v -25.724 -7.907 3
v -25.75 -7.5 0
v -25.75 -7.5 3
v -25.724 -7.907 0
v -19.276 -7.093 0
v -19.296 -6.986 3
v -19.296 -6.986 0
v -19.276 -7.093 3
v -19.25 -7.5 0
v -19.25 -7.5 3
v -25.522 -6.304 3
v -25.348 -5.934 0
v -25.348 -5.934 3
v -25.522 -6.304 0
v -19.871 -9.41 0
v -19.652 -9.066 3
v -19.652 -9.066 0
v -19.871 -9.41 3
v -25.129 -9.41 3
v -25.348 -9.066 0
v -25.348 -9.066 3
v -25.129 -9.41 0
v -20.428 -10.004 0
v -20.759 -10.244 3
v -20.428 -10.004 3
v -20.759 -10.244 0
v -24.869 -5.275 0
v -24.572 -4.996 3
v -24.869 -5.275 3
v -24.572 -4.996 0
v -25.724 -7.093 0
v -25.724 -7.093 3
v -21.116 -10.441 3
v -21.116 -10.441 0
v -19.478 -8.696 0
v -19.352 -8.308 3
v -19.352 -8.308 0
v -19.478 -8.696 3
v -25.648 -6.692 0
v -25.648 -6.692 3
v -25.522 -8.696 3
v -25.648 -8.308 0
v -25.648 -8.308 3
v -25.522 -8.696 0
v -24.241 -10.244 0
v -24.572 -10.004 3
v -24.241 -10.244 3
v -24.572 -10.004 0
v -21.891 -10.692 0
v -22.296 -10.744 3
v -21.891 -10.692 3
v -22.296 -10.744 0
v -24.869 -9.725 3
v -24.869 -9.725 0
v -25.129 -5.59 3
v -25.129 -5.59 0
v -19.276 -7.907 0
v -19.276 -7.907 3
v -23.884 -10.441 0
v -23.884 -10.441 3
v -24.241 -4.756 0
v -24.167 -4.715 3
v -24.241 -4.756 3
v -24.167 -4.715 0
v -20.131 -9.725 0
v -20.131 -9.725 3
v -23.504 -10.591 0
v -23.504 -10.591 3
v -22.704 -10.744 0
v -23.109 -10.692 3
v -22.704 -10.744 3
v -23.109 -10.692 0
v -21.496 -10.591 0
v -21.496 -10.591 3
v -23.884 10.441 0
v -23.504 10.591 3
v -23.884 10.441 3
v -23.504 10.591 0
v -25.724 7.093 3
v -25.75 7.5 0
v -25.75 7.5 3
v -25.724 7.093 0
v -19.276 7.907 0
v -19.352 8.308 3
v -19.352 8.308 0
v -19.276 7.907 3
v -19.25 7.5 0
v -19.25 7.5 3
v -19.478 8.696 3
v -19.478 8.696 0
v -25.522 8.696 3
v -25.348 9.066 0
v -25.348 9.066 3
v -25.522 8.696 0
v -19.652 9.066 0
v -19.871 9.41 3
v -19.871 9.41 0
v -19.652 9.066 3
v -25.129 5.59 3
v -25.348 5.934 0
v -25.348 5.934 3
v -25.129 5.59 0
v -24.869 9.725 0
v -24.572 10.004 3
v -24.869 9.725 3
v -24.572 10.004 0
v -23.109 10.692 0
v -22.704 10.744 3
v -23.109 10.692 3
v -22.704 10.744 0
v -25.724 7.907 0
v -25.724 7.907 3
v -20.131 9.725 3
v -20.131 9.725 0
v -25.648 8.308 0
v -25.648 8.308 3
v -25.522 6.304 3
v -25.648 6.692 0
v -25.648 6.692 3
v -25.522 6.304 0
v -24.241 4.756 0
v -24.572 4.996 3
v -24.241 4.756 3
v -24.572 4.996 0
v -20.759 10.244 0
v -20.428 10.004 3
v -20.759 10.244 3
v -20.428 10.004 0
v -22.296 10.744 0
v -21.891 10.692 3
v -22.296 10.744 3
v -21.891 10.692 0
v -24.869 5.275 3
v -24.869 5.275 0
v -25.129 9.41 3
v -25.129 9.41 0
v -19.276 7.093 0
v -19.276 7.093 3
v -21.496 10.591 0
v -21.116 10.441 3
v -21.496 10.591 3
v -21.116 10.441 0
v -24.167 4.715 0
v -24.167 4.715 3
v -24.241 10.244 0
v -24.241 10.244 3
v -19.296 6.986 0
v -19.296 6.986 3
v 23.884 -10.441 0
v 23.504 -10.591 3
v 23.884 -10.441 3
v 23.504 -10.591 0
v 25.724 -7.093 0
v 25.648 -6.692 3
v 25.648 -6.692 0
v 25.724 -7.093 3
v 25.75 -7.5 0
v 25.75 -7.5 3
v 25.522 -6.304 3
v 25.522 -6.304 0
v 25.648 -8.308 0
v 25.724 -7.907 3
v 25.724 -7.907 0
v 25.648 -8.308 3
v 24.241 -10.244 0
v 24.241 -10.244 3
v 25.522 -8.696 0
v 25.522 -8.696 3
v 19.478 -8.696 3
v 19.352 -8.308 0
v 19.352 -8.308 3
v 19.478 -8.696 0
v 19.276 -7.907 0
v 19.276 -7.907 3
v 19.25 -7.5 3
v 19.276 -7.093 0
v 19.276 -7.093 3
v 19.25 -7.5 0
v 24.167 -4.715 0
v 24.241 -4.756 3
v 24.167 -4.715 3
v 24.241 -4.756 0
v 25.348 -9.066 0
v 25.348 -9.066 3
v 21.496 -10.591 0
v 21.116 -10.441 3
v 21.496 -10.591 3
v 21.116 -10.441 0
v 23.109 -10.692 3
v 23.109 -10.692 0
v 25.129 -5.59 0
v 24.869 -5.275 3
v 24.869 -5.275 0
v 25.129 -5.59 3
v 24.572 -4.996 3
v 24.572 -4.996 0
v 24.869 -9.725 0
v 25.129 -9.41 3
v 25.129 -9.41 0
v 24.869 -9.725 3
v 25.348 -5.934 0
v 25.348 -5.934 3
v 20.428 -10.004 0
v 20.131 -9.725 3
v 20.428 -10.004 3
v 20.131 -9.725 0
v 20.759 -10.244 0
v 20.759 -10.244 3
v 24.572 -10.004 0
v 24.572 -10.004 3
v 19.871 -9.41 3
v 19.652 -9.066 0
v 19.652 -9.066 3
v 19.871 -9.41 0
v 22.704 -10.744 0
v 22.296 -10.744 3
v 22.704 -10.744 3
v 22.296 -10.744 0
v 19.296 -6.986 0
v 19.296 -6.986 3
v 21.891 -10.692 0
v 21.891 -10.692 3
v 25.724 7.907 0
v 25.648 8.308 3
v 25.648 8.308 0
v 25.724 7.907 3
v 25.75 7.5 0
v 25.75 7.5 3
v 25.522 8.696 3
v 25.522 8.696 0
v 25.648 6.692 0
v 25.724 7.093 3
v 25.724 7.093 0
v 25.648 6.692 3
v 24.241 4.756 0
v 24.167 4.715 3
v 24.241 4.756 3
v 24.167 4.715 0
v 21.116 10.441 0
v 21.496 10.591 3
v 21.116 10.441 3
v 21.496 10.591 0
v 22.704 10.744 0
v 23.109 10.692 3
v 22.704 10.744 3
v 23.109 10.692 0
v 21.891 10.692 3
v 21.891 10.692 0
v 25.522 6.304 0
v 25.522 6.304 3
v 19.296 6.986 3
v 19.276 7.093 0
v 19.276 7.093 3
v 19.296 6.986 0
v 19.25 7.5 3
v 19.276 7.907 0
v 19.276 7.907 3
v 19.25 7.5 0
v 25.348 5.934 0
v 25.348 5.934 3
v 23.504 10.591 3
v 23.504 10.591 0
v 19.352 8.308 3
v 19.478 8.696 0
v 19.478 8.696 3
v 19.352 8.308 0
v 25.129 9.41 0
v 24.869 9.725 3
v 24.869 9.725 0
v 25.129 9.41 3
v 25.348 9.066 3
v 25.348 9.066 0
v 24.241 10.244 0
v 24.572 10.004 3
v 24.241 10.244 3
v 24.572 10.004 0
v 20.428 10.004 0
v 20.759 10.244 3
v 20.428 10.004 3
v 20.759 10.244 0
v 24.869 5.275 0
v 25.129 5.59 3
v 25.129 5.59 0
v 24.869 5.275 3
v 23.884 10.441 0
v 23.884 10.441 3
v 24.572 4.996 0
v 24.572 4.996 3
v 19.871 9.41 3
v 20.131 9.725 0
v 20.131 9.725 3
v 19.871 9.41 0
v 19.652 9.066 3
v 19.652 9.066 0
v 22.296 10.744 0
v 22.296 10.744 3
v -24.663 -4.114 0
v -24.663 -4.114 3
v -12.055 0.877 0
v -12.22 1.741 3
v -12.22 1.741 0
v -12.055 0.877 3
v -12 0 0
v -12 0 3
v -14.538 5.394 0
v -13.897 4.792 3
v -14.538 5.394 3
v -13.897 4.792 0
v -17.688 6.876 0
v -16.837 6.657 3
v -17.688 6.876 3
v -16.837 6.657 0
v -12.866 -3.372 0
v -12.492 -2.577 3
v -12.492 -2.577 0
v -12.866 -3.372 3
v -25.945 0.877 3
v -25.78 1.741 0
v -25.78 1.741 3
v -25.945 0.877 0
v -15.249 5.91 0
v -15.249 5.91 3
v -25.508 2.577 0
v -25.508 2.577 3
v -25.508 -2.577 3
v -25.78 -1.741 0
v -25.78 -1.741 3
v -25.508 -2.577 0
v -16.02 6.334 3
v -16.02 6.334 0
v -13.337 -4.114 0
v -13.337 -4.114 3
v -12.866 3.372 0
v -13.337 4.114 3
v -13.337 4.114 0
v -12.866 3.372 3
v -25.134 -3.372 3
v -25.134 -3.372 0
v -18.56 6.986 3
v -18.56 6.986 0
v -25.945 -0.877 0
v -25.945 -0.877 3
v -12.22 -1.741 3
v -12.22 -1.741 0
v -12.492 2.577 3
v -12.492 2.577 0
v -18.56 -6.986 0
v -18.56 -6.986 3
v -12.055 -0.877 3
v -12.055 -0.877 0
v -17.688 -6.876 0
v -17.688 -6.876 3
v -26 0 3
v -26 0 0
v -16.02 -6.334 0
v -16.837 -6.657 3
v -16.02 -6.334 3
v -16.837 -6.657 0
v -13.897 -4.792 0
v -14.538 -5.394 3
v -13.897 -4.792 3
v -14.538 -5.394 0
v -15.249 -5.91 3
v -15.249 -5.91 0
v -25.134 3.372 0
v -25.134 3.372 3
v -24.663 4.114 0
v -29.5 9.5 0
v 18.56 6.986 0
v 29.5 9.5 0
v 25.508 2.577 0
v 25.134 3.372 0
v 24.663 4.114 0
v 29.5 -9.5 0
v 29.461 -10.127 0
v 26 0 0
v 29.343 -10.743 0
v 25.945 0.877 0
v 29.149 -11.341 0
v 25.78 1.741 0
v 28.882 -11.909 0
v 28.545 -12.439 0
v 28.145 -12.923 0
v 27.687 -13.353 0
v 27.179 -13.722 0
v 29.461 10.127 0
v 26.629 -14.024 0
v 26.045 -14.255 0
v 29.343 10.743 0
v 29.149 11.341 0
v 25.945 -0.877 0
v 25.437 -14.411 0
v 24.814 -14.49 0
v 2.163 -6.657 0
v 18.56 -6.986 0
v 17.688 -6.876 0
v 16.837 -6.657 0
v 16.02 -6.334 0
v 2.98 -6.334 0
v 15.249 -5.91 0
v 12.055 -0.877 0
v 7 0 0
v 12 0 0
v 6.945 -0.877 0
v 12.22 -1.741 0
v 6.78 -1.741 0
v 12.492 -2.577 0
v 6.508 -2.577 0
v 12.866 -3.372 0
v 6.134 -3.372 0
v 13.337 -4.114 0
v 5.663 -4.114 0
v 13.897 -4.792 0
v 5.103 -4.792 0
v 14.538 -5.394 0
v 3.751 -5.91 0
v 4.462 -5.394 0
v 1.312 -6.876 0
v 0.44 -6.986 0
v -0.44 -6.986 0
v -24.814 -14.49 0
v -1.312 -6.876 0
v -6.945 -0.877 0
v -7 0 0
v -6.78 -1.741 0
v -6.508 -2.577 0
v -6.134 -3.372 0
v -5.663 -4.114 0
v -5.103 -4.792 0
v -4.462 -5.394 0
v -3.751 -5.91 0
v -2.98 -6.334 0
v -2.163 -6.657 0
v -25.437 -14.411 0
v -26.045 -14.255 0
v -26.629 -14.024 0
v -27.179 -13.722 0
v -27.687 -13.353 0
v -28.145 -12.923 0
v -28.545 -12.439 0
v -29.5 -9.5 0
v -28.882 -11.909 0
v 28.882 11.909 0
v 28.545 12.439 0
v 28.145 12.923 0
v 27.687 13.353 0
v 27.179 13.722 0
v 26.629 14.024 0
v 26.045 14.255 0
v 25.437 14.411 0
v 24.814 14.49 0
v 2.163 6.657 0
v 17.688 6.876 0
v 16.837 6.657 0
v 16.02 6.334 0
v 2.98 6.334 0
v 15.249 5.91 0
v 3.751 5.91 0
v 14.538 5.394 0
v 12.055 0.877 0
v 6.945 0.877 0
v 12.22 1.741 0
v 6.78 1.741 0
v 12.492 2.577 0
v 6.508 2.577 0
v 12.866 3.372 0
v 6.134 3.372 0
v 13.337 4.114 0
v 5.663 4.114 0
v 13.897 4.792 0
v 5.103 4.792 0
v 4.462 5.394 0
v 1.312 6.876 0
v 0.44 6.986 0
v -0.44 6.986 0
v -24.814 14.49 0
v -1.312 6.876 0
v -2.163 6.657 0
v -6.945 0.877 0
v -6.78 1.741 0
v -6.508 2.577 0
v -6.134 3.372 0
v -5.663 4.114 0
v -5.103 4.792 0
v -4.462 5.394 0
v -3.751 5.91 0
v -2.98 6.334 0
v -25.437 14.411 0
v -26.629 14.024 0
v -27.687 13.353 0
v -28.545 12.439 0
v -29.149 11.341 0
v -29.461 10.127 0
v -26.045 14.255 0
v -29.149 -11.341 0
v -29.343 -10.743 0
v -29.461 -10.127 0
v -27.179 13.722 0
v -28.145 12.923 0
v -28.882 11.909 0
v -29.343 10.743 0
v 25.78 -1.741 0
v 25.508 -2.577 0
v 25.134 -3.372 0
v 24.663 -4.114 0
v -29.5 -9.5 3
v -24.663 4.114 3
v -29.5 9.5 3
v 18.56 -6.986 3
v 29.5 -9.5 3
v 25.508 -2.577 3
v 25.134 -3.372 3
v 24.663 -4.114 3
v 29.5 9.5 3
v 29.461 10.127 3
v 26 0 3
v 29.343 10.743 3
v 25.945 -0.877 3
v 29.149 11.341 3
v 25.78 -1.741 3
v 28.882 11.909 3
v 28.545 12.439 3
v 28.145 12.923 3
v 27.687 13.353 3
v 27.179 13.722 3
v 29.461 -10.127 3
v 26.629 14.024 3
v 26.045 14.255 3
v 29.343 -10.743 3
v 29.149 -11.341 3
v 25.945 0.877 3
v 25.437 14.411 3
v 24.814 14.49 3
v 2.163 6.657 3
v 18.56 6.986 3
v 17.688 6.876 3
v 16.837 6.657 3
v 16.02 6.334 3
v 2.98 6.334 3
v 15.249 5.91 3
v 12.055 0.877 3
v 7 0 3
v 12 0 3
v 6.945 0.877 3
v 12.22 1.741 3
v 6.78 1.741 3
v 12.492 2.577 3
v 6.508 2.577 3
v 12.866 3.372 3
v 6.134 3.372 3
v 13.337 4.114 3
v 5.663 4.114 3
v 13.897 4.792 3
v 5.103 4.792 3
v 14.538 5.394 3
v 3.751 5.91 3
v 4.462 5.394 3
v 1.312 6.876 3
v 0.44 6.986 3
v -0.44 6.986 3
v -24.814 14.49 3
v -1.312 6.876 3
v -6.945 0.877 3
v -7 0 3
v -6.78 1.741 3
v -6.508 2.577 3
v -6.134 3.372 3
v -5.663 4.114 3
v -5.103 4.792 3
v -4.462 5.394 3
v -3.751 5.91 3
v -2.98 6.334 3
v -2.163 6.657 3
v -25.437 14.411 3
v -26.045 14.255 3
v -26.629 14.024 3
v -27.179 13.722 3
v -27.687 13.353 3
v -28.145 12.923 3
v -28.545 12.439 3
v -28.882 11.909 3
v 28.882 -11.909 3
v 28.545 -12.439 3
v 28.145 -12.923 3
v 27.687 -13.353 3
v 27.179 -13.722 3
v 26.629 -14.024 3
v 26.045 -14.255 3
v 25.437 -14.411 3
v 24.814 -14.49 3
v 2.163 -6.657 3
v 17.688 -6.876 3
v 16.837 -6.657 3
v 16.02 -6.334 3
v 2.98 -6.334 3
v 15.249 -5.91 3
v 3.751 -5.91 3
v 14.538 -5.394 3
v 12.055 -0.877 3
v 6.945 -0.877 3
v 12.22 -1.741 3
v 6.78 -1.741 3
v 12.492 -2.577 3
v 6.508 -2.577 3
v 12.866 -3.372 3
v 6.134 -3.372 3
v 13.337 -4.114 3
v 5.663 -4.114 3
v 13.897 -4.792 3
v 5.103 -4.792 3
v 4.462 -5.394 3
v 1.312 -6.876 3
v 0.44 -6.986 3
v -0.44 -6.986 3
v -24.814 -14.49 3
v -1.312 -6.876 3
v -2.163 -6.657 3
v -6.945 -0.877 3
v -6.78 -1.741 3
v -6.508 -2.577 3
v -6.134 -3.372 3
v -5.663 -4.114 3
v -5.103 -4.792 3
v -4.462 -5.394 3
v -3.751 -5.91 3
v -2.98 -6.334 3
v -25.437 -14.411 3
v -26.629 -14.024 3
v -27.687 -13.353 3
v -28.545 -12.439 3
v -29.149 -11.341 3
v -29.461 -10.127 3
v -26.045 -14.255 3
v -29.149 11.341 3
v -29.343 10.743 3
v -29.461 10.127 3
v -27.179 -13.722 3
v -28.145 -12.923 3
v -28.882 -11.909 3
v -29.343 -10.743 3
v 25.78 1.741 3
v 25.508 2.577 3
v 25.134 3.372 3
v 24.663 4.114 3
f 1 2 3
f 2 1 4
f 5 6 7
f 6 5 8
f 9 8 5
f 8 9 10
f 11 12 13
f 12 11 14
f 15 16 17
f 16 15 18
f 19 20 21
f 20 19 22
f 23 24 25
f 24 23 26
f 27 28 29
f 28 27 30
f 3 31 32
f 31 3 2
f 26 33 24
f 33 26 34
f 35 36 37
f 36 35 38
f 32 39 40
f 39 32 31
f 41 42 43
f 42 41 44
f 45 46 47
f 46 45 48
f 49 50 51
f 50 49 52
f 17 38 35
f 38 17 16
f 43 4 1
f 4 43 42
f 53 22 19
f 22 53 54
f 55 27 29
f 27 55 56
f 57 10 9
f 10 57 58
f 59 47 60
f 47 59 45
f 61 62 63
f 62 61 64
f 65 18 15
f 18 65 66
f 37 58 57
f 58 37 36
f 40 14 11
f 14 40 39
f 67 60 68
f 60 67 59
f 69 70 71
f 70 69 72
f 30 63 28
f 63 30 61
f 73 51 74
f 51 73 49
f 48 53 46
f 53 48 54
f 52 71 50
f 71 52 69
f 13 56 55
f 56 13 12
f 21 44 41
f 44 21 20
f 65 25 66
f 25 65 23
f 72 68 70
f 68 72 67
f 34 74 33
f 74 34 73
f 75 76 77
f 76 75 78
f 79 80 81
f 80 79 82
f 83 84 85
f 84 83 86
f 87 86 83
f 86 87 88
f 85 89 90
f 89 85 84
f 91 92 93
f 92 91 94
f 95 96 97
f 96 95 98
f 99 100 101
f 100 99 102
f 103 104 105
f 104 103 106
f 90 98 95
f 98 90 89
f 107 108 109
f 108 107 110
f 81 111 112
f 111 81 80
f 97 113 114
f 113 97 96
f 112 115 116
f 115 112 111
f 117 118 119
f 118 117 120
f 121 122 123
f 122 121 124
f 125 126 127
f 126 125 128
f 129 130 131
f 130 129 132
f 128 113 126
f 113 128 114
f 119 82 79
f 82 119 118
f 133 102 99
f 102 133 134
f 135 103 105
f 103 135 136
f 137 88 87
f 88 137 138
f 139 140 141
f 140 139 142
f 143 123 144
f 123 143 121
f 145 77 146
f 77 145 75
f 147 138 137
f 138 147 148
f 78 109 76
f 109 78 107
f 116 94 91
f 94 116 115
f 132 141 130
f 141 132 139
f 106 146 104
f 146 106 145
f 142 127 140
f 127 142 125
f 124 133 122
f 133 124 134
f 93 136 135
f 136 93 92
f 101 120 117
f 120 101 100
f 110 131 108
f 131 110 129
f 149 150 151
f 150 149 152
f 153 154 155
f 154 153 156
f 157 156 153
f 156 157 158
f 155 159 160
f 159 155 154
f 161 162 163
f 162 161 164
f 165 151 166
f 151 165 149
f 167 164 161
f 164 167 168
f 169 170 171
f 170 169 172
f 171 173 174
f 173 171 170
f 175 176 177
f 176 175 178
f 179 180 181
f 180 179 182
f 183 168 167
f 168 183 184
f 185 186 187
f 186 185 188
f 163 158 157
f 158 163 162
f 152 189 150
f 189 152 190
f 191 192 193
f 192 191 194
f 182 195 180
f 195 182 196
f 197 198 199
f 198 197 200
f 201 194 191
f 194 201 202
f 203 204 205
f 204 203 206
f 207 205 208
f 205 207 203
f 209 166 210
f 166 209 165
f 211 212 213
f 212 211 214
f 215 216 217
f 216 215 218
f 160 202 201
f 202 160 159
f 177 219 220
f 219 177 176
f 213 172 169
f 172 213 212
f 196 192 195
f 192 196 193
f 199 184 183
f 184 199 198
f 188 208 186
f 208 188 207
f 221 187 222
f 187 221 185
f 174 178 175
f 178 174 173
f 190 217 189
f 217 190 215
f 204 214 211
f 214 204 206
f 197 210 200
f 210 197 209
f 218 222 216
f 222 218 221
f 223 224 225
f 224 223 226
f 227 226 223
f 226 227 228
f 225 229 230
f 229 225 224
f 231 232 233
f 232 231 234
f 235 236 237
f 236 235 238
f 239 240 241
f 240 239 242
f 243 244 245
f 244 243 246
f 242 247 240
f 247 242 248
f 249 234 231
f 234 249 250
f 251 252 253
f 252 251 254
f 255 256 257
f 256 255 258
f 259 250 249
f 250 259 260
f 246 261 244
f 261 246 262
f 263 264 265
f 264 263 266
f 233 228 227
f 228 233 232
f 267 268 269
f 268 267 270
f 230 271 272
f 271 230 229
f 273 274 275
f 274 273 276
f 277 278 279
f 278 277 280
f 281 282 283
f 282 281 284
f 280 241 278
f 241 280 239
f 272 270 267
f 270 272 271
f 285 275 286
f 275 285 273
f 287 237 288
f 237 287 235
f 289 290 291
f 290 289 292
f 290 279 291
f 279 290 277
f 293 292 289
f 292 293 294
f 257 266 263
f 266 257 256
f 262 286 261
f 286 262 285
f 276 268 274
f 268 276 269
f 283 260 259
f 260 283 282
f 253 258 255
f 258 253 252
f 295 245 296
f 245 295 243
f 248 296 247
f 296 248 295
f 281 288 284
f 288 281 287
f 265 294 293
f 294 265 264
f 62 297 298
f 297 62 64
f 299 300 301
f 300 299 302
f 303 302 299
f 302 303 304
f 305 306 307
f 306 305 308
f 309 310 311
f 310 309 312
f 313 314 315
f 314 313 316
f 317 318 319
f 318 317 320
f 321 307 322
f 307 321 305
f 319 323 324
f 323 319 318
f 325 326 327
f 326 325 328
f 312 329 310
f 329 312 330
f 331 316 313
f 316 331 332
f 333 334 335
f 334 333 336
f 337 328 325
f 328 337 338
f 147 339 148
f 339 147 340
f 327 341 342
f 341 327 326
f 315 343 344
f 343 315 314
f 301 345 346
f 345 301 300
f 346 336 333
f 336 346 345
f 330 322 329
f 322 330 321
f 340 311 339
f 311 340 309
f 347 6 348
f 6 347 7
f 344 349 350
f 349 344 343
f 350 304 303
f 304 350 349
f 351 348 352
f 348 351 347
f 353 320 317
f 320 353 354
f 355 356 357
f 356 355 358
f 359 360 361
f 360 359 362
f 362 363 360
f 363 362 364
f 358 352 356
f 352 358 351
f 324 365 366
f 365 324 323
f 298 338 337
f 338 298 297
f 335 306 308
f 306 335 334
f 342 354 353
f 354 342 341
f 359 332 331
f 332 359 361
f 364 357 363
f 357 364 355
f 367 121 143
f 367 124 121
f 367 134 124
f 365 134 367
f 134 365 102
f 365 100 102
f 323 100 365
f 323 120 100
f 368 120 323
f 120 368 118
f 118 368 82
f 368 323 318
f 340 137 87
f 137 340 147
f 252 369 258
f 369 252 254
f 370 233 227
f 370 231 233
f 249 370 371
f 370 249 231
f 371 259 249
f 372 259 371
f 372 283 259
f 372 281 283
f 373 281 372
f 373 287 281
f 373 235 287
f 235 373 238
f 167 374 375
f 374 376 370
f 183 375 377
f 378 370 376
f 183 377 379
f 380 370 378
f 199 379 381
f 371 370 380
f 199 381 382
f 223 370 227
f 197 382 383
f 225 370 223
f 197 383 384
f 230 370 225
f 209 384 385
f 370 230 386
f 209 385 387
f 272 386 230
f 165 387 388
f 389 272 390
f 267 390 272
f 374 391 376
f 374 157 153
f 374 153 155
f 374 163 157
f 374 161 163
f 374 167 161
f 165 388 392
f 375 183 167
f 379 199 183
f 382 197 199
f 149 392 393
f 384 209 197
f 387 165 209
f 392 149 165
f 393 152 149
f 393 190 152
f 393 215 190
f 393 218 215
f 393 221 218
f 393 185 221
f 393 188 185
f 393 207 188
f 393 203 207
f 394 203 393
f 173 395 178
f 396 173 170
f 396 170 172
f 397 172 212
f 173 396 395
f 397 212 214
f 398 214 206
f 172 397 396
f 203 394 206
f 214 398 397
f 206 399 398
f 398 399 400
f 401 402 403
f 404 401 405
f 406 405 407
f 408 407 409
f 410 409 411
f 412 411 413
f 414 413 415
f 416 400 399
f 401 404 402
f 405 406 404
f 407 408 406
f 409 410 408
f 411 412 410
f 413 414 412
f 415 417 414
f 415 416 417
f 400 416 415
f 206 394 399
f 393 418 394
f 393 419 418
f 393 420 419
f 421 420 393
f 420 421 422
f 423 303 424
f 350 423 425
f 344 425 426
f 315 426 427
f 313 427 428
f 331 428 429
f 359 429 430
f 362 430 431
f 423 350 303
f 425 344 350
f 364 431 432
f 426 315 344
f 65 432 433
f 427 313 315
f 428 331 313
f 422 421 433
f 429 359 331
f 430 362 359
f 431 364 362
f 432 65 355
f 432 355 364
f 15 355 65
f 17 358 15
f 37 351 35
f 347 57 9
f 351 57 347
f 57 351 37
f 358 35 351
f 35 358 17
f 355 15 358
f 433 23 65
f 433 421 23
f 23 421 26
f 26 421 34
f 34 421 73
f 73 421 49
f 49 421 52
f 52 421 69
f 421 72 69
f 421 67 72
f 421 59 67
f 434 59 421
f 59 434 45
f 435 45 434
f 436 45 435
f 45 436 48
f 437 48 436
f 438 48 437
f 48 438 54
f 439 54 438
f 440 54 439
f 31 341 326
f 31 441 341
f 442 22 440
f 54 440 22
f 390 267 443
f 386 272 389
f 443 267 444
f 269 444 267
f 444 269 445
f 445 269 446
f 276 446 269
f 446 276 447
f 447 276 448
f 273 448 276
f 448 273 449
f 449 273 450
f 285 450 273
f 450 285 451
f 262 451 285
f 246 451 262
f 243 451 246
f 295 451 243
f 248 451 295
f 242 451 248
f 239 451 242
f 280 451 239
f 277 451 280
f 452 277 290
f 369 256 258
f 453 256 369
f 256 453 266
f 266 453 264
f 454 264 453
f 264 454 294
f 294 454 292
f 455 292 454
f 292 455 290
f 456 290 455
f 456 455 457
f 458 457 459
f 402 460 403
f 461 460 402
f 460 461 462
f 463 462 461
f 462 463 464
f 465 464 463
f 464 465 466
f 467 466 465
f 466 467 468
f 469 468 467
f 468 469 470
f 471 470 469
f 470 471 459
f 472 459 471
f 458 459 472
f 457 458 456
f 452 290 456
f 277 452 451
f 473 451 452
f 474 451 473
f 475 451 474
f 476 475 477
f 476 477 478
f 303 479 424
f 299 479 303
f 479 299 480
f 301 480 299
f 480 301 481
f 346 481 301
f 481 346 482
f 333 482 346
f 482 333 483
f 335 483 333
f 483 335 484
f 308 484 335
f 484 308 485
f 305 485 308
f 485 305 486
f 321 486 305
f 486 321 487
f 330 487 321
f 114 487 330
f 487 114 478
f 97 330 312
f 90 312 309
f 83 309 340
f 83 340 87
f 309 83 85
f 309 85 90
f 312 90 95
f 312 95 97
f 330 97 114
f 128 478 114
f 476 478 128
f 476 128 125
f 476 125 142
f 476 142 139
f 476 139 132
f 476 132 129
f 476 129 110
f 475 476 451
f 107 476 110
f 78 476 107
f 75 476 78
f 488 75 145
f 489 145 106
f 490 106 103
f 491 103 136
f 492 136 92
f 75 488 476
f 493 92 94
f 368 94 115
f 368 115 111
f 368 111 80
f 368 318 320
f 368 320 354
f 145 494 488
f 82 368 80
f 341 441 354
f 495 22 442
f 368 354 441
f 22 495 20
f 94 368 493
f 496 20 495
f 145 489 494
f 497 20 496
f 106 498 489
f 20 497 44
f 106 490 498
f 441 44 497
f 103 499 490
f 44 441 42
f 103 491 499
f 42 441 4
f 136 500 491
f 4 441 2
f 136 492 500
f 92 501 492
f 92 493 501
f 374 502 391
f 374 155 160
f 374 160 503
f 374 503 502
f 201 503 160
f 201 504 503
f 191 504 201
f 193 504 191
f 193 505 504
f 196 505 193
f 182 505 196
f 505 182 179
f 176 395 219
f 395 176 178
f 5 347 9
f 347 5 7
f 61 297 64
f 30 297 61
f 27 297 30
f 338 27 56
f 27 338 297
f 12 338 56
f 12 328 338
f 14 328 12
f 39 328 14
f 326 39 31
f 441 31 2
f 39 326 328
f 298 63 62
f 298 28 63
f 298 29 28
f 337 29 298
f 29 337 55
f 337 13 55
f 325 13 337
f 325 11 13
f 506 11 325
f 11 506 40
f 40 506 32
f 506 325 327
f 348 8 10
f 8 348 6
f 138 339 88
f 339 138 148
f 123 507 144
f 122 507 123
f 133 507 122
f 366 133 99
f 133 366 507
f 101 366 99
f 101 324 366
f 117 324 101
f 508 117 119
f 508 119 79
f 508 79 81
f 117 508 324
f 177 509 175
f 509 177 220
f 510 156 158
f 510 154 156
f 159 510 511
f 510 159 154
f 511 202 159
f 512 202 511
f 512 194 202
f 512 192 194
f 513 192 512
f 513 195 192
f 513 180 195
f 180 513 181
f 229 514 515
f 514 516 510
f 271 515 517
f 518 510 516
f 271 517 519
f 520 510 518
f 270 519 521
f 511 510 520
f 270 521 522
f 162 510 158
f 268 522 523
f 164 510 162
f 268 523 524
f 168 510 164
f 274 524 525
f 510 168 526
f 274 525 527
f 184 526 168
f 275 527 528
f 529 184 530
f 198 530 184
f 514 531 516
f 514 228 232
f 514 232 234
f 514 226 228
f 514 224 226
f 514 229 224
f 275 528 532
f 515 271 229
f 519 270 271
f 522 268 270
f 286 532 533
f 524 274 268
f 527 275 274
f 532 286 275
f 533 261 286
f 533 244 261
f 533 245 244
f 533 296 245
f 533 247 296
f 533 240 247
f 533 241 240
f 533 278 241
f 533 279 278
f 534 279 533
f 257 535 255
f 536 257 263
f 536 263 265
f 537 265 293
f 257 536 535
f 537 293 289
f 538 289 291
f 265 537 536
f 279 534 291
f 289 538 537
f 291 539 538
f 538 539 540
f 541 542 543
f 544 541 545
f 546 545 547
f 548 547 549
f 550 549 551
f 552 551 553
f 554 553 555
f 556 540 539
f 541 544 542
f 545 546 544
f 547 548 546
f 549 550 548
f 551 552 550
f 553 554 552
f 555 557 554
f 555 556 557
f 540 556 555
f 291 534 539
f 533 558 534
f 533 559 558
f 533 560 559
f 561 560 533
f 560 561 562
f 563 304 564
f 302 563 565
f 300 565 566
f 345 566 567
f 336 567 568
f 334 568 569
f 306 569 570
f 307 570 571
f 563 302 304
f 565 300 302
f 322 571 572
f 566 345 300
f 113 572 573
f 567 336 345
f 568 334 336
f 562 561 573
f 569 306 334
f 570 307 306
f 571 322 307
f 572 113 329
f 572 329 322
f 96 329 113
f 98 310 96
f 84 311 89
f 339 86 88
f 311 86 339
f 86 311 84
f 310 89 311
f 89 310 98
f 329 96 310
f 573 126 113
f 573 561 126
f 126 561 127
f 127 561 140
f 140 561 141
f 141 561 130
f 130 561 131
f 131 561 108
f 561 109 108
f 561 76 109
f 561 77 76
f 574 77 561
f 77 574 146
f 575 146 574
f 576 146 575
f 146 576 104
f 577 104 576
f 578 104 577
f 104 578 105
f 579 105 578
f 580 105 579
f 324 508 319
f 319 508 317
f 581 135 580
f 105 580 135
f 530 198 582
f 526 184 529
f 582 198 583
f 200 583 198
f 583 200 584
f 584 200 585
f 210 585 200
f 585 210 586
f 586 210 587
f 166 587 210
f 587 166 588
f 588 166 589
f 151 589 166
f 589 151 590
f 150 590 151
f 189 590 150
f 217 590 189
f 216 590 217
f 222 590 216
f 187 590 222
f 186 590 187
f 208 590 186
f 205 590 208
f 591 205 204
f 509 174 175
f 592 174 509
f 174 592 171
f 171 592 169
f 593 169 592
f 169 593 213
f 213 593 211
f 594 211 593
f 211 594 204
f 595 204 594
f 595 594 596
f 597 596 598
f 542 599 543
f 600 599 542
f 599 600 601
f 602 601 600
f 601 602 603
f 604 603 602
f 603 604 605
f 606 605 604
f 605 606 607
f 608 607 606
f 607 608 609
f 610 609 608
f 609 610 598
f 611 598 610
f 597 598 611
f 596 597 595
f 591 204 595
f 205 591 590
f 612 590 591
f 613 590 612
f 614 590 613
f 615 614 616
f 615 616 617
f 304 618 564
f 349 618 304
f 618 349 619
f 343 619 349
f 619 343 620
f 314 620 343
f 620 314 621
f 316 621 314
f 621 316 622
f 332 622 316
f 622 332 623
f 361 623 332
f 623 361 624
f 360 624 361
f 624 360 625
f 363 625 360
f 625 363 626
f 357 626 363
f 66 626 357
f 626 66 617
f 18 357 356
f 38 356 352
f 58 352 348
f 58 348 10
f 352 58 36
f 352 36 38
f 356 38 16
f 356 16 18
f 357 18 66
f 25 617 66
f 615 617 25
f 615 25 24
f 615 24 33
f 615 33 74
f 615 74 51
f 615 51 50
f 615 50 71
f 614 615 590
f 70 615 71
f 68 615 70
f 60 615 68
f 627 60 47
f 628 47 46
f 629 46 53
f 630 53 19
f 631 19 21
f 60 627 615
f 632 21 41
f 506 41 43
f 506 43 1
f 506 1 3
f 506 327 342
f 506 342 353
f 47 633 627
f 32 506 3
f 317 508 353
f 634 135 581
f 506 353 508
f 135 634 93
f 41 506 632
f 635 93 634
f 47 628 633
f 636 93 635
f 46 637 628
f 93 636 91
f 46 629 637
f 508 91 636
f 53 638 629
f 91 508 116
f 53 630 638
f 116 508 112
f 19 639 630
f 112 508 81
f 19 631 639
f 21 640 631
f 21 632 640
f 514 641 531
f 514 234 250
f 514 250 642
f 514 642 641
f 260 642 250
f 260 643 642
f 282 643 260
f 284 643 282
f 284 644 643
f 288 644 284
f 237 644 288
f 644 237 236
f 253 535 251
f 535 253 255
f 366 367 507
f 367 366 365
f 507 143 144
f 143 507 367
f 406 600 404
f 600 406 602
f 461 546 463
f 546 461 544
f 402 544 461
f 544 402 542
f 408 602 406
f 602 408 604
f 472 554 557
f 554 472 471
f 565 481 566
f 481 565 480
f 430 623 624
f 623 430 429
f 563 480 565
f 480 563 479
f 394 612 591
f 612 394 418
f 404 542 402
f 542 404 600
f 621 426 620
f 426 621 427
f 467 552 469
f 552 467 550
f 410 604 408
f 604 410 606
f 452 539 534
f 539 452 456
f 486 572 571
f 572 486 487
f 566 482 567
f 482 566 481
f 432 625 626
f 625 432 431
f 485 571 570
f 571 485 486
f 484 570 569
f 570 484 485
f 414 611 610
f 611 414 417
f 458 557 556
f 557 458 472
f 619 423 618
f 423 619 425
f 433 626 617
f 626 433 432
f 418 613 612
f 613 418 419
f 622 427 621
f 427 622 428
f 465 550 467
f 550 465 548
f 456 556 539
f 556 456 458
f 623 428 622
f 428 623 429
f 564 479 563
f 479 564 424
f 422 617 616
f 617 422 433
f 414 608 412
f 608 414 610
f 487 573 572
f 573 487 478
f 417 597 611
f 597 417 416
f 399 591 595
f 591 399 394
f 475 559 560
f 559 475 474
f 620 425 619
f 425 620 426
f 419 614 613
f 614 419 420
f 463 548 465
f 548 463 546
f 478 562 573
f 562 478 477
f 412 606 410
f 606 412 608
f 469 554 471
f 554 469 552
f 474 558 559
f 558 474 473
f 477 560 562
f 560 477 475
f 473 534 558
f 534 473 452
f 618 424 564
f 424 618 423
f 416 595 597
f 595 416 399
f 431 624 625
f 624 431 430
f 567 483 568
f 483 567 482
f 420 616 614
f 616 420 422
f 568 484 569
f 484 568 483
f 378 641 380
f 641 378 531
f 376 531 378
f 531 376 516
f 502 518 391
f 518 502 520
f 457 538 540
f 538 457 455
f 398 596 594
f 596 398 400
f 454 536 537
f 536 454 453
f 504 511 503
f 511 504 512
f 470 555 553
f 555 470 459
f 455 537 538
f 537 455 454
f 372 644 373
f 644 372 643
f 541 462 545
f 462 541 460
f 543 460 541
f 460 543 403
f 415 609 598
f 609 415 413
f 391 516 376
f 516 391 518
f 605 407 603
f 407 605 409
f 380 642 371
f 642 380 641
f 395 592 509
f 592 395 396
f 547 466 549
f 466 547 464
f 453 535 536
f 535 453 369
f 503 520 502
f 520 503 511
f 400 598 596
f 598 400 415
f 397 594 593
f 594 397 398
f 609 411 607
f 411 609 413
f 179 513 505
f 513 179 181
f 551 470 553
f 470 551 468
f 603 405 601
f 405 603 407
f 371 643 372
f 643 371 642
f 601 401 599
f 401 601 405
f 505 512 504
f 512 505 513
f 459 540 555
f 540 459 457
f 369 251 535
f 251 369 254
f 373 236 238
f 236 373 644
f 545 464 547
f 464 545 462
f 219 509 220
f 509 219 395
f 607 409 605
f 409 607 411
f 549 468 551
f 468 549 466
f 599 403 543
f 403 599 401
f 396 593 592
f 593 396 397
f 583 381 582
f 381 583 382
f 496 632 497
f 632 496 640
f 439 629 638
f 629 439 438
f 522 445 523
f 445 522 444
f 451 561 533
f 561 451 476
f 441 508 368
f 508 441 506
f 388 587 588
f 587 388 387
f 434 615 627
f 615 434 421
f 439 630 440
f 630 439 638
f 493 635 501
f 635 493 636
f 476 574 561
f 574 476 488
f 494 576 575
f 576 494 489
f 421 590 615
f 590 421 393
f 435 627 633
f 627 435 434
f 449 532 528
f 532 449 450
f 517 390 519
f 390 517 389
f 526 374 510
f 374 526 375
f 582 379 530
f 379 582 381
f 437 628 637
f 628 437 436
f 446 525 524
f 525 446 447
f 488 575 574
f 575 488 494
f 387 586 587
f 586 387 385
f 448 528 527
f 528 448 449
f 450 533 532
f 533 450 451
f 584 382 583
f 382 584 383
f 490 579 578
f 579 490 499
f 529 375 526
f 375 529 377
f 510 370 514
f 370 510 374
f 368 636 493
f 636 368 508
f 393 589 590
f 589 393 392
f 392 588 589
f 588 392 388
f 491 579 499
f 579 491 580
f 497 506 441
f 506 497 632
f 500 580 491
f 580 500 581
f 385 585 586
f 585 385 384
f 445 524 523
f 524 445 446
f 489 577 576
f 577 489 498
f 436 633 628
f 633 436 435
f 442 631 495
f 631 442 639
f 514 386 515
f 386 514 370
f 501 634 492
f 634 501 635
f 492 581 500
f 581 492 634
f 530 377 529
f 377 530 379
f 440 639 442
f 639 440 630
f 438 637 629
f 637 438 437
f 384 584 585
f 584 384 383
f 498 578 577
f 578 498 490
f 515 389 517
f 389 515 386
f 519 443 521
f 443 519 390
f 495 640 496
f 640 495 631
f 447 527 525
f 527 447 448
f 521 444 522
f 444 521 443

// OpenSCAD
$fn = 50;


difference() {
	union() {
		hull() {
			translate(v = [-24.5000000000, 9.5000000000, 0]) {
				cylinder(h = 3, r = 5);
			}
			translate(v = [24.5000000000, 9.5000000000, 0]) {
				cylinder(h = 3, r = 5);
			}
			translate(v = [-24.5000000000, -9.5000000000, 0]) {
				cylinder(h = 3, r = 5);
			}
			translate(v = [24.5000000000, -9.5000000000, 0]) {
				cylinder(h = 3, r = 5);
			}
		}
	}
	union() {
		#translate(v = [-22.5000000000, -7.5000000000, -100.0000000000]) {
			cylinder(h = 200, r = 3.2500000000);
		}
		#translate(v = [-22.5000000000, 7.5000000000, -100.0000000000]) {
			cylinder(h = 200, r = 3.2500000000);
		}
		#translate(v = [22.5000000000, -7.5000000000, -100.0000000000]) {
			cylinder(h = 200, r = 3.2500000000);
		}
		#translate(v = [22.5000000000, 7.5000000000, -100.0000000000]) {
			cylinder(h = 200, r = 3.2500000000);
		}
		#translate(v = [-19.0000000000, 0, 0]) {
			cylinder(h = 3, r = 7.0000000000);
		}
		#cylinder(h = 3, r = 7.0000000000);
		#translate(v = [19.0000000000, 0, 0]) {
			cylinder(h = 3, r = 7.0000000000);
		}
	}
}
